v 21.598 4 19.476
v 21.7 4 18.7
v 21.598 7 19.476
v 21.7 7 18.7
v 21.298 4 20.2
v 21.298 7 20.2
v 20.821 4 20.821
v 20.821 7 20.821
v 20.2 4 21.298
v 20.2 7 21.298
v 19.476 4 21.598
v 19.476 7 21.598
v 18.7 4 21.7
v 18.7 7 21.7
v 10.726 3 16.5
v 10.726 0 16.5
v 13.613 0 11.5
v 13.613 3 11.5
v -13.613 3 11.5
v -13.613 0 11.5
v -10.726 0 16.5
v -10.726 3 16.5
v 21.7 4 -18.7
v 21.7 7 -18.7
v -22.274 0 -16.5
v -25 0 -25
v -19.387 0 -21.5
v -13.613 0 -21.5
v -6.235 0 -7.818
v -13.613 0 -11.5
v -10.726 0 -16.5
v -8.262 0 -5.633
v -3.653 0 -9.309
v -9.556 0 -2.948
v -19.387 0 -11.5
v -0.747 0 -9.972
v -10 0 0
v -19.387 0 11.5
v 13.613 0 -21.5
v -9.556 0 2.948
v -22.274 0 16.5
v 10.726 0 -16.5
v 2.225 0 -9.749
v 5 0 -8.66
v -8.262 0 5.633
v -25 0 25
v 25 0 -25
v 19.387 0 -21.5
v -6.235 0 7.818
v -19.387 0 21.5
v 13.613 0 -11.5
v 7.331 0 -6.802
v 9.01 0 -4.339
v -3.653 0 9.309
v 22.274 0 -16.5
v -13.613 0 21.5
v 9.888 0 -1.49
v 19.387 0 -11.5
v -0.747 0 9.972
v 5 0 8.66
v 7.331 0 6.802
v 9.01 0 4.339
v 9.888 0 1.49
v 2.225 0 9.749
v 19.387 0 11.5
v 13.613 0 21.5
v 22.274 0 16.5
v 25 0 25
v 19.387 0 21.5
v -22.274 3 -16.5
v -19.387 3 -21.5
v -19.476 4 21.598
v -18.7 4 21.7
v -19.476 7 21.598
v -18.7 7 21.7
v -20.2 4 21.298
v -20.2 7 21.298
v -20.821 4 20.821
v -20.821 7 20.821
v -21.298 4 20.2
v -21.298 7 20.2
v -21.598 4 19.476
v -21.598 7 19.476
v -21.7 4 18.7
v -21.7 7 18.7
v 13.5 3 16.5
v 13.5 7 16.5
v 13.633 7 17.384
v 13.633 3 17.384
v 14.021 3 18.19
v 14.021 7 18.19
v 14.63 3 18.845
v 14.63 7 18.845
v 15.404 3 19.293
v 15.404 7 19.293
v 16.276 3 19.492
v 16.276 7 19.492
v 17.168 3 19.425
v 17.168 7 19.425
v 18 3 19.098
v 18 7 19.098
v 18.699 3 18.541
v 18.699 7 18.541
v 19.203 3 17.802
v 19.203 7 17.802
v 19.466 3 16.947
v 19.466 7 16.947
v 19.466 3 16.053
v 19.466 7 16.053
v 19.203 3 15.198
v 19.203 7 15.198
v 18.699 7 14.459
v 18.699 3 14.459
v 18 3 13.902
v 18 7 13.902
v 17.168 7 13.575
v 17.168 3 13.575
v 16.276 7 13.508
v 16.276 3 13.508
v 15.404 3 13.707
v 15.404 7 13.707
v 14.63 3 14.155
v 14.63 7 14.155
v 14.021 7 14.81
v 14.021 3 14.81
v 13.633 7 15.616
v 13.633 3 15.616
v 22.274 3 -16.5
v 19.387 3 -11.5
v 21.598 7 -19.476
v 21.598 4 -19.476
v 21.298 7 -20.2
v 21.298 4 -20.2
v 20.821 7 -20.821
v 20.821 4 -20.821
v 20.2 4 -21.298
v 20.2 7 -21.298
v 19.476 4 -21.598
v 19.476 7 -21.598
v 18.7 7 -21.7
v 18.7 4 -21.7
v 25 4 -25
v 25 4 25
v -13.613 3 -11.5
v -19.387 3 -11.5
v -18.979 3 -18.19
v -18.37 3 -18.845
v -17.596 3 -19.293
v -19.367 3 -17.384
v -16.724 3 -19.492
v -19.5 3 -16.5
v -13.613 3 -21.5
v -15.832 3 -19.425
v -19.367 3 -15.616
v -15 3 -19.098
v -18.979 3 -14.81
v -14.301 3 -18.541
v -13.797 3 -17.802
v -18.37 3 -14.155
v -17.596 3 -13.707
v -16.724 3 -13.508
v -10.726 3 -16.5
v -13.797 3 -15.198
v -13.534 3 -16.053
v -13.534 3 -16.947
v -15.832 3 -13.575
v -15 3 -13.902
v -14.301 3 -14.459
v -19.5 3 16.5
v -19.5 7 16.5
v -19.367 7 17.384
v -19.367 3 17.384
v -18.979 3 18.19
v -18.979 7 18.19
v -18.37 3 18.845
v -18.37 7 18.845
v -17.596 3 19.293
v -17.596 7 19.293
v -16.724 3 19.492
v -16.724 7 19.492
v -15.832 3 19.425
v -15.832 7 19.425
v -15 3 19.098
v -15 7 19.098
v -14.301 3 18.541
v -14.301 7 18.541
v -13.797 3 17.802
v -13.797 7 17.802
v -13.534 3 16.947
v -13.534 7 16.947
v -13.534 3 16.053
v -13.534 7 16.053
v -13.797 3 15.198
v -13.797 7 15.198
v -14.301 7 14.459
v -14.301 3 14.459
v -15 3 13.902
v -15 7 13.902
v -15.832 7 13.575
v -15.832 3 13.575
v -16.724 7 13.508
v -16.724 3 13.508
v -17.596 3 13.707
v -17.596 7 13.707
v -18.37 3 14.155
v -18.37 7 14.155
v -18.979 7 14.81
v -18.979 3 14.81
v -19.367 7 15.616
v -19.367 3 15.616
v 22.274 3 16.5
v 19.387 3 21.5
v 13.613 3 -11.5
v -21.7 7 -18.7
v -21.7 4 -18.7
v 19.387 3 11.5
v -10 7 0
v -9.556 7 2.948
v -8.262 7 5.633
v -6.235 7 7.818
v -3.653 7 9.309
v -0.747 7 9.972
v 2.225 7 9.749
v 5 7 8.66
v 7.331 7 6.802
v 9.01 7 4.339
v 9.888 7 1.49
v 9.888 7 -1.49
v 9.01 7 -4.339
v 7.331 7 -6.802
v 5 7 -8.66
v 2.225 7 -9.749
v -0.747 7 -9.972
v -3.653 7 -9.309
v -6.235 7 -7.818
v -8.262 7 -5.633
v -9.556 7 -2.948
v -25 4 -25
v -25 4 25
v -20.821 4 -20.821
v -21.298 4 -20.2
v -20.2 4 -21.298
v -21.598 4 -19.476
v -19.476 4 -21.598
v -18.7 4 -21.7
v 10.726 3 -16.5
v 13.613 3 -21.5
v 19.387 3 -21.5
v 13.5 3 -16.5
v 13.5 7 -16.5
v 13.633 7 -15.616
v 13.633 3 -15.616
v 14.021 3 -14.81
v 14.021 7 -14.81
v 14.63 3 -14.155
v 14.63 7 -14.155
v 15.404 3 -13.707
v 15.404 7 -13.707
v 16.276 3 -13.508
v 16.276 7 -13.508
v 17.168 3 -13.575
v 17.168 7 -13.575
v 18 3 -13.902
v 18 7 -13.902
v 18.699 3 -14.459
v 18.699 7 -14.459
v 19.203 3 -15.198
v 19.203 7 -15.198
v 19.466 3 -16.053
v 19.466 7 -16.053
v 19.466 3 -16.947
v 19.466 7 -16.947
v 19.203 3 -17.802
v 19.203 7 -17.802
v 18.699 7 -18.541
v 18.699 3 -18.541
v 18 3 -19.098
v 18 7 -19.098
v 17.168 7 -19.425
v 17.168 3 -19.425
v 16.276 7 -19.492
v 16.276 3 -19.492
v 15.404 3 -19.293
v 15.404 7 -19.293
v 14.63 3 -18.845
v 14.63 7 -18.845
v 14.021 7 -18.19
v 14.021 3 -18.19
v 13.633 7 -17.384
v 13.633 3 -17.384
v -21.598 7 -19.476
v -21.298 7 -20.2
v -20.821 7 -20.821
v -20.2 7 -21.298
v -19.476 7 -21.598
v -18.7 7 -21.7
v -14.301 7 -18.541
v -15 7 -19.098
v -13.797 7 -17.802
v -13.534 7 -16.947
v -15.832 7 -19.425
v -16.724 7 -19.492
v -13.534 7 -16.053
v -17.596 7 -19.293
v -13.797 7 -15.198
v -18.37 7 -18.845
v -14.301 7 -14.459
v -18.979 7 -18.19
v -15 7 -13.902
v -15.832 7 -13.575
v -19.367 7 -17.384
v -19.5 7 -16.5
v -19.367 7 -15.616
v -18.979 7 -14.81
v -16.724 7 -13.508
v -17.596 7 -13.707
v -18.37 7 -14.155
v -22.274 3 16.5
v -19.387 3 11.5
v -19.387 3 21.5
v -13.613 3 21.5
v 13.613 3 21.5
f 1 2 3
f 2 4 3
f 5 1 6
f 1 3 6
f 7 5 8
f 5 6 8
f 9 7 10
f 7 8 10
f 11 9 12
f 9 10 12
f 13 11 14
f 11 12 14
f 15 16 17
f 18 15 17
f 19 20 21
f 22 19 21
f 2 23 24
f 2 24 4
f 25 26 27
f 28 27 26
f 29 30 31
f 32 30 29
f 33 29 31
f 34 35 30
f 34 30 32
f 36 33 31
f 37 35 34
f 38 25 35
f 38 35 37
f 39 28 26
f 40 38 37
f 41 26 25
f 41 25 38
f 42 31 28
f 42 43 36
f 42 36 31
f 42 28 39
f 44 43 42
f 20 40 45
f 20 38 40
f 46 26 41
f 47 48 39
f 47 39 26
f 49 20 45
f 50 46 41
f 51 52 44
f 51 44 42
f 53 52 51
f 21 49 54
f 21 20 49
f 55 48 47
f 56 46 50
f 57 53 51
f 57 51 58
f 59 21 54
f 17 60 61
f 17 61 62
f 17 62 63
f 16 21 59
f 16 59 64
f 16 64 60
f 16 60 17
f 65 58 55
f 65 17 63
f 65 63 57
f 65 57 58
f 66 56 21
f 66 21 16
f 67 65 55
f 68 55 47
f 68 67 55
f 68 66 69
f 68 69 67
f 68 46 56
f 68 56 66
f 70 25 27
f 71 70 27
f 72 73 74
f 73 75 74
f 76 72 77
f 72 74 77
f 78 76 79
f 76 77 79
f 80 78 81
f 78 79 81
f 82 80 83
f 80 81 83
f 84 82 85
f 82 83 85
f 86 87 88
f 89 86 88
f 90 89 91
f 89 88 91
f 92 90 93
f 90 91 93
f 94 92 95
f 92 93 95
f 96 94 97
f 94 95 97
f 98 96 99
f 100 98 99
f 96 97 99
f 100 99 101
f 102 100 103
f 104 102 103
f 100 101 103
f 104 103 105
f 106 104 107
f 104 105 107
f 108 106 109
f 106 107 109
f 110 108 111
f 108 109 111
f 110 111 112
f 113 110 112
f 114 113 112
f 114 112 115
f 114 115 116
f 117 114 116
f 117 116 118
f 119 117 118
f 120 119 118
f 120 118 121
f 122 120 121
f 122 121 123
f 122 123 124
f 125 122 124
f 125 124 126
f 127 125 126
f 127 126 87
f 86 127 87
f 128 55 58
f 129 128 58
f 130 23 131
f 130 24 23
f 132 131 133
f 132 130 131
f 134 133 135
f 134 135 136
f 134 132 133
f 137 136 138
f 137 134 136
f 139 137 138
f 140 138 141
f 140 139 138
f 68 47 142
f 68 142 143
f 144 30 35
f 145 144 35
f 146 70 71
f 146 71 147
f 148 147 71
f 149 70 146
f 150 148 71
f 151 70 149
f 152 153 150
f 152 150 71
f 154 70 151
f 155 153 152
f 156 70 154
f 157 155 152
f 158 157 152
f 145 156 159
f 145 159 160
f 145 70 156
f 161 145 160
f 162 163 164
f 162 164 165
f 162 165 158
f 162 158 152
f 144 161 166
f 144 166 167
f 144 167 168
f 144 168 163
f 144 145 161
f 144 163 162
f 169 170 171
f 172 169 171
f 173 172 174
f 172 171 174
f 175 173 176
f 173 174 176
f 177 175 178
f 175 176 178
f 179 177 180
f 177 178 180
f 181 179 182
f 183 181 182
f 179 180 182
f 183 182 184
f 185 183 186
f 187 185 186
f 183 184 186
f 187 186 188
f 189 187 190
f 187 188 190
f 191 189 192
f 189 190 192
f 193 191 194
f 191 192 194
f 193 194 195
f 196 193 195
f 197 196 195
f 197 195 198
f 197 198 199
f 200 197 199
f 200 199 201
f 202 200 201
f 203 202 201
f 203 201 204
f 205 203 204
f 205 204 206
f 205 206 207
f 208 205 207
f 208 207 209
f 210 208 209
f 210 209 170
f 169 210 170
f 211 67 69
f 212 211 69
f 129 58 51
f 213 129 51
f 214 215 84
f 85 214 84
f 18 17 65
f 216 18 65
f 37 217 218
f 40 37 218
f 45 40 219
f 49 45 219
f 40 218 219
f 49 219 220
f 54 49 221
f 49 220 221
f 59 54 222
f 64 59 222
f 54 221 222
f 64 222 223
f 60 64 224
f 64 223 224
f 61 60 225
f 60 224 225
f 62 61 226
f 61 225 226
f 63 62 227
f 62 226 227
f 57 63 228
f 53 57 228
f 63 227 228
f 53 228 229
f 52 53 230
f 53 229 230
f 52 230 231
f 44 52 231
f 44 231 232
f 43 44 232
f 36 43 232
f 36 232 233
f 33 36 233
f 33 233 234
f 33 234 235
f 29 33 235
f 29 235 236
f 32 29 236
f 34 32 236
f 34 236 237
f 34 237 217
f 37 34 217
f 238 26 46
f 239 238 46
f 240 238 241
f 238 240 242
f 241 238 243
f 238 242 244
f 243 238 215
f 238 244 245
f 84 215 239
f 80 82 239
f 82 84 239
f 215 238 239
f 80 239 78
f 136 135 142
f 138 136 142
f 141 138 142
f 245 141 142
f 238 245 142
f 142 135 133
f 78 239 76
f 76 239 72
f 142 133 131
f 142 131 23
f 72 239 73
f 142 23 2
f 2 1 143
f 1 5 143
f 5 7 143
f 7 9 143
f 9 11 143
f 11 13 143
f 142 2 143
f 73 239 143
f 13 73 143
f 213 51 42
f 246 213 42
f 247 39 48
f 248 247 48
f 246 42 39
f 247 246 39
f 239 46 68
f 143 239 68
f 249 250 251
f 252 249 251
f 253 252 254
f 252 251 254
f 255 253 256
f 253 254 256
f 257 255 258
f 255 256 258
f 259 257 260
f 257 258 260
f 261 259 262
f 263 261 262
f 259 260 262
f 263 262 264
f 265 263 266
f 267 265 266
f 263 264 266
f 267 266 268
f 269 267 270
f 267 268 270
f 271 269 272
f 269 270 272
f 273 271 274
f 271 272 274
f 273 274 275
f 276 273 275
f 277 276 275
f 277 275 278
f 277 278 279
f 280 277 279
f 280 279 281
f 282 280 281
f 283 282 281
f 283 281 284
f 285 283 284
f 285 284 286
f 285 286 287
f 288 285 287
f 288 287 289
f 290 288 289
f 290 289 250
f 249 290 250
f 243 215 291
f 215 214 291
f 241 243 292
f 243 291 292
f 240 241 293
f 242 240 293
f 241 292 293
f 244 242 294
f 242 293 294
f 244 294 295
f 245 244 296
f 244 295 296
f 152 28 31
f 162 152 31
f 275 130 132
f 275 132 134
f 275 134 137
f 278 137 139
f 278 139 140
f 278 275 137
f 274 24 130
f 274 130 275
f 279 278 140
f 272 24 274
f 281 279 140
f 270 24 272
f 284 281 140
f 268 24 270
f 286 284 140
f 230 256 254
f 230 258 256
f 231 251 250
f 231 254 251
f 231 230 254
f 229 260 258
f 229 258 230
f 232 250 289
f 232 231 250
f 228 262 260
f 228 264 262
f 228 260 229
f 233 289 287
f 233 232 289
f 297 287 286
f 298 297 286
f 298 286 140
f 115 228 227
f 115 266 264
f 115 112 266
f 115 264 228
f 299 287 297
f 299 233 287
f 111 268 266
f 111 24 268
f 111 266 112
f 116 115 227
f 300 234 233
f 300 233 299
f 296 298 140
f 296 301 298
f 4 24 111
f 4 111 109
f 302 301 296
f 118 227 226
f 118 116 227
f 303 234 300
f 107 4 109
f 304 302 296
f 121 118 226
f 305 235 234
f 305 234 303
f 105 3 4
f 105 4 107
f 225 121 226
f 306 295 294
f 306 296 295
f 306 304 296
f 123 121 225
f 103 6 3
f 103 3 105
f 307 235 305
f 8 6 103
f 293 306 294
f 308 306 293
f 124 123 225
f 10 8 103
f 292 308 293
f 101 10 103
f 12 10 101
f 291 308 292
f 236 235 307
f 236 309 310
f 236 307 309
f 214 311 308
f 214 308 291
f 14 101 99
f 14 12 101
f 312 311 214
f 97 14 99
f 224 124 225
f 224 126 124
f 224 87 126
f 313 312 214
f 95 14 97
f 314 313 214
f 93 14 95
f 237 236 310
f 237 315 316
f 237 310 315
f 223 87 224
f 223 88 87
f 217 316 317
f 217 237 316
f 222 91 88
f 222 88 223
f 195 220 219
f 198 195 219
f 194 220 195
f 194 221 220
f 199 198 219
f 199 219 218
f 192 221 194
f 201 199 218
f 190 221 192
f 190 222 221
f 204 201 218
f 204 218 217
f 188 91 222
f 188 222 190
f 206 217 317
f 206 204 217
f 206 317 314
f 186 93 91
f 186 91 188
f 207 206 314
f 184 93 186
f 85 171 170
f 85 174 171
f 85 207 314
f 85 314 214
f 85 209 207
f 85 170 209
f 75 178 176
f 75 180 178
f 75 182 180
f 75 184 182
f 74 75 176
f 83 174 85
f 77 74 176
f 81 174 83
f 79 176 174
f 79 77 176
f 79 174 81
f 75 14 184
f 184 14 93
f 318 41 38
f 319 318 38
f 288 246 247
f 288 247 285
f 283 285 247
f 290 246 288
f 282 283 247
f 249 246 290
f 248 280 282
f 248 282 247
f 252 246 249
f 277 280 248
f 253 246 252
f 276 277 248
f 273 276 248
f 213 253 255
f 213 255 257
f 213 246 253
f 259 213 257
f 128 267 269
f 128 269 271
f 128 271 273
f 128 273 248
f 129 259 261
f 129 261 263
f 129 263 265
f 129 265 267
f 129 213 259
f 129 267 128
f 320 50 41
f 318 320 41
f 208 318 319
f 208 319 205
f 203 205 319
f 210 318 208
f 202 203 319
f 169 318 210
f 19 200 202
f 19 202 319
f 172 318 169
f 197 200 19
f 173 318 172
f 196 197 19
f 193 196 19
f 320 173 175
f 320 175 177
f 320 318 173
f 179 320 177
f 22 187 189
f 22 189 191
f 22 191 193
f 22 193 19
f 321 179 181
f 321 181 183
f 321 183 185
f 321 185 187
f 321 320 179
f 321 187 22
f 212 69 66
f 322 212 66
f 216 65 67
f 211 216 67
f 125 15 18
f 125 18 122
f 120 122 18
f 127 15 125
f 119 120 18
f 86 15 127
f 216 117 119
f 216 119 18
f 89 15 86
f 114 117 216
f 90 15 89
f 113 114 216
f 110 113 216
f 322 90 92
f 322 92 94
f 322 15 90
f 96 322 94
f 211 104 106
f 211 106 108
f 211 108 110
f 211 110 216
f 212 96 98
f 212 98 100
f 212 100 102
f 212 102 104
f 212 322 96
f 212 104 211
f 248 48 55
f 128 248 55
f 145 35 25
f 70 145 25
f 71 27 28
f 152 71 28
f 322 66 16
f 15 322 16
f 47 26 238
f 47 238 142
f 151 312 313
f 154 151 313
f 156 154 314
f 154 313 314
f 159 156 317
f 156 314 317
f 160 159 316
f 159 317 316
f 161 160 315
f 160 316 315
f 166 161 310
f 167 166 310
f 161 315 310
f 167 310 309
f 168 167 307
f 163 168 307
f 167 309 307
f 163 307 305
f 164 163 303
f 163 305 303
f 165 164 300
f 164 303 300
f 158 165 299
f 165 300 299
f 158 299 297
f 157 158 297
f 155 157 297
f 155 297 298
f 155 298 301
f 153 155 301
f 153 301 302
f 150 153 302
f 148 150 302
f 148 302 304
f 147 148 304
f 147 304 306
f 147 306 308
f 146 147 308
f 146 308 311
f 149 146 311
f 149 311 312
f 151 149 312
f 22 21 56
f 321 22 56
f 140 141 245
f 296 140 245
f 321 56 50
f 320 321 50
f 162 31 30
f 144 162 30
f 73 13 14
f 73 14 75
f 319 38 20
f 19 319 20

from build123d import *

# Parameters (mm, degrees)
F0_W     = 50
F0_H     = 50
F1_DEPTH = 4
F2_W     = 43.4
F2_H     = 43.4
F3_DEPTH = 3
F4_R     = 3
F4_R_2   = 10
F5_DEPTH = 25
F7_DEPTH = 3
F8_R     = 3


with BuildPart() as f1:
    # F0 (on Front) → F1 (new body)
    with BuildSketch(Plane.XZ):
        Rectangle(F0_W, F0_H)
    extrude(amount=-F1_DEPTH)

    # F2 (on face) → F3 (join)
    with BuildSketch(Plane(origin=(0, 4, 0), x_dir=(-1, 0, 0), z_dir=(0, 1, 0))):
        Rectangle(F2_W, F2_H)
    extrude(amount=F3_DEPTH)

    # F4 (on face) → F5 (cut)
    with BuildSketch(Plane(origin=(0, 7, 0), x_dir=(-1, 0, 0), z_dir=(0, 1, 0))):
        with Locations((-16.5, 16.5)):
            Circle(F4_R)
        with Locations((16.5, 16.5)):
            Circle(F4_R)
        with Locations((16.5, -16.5)):
            Circle(F4_R)
        with Locations((-16.5, -16.5)):
            Circle(F4_R)
        Circle(F4_R_2)
    extrude(amount=-F5_DEPTH, mode=Mode.SUBTRACT)

    # F6 (on face) → F7 (cut)
    with BuildSketch(Plane.XZ):
        Polygon((-19.386751, 11.5), (-13.613249, 11.5), (-10.726497, 16.5), (-13.613249, 21.5), (-19.386751, 21.5), (-22.273503, 16.5), align=None)
        Polygon((19.386751, 21.5), (13.613249, 21.5), (10.726497, 16.5), (13.613249, 11.5), (19.386751, 11.5), (22.273503, 16.5), align=None)
        Polygon((13.613249, -21.5), (19.386751, -21.5), (22.273503, -16.5), (19.386751, -11.5), (13.613249, -11.5), (10.726497, -16.5), align=None)
        Polygon((-19.386751, -21.5), (-13.613249, -21.5), (-10.726497, -16.5), (-13.613249, -11.5), (-19.386751, -11.5), (-22.273503, -16.5), align=None)
    extrude(amount=-F7_DEPTH, mode=Mode.SUBTRACT)

    # F8
    f8_edges = [f1.edges().sort_by_distance(p)[0] for p in [
        (21.7, 5.5, 21.7),
        (-21.7, 5.5, 21.7),
        (-21.7, 5.5, -21.7),
        (21.7, 5.5, -21.7),
    ]]
    fillet(f8_edges, radius=F8_R)


solid = f1.part
